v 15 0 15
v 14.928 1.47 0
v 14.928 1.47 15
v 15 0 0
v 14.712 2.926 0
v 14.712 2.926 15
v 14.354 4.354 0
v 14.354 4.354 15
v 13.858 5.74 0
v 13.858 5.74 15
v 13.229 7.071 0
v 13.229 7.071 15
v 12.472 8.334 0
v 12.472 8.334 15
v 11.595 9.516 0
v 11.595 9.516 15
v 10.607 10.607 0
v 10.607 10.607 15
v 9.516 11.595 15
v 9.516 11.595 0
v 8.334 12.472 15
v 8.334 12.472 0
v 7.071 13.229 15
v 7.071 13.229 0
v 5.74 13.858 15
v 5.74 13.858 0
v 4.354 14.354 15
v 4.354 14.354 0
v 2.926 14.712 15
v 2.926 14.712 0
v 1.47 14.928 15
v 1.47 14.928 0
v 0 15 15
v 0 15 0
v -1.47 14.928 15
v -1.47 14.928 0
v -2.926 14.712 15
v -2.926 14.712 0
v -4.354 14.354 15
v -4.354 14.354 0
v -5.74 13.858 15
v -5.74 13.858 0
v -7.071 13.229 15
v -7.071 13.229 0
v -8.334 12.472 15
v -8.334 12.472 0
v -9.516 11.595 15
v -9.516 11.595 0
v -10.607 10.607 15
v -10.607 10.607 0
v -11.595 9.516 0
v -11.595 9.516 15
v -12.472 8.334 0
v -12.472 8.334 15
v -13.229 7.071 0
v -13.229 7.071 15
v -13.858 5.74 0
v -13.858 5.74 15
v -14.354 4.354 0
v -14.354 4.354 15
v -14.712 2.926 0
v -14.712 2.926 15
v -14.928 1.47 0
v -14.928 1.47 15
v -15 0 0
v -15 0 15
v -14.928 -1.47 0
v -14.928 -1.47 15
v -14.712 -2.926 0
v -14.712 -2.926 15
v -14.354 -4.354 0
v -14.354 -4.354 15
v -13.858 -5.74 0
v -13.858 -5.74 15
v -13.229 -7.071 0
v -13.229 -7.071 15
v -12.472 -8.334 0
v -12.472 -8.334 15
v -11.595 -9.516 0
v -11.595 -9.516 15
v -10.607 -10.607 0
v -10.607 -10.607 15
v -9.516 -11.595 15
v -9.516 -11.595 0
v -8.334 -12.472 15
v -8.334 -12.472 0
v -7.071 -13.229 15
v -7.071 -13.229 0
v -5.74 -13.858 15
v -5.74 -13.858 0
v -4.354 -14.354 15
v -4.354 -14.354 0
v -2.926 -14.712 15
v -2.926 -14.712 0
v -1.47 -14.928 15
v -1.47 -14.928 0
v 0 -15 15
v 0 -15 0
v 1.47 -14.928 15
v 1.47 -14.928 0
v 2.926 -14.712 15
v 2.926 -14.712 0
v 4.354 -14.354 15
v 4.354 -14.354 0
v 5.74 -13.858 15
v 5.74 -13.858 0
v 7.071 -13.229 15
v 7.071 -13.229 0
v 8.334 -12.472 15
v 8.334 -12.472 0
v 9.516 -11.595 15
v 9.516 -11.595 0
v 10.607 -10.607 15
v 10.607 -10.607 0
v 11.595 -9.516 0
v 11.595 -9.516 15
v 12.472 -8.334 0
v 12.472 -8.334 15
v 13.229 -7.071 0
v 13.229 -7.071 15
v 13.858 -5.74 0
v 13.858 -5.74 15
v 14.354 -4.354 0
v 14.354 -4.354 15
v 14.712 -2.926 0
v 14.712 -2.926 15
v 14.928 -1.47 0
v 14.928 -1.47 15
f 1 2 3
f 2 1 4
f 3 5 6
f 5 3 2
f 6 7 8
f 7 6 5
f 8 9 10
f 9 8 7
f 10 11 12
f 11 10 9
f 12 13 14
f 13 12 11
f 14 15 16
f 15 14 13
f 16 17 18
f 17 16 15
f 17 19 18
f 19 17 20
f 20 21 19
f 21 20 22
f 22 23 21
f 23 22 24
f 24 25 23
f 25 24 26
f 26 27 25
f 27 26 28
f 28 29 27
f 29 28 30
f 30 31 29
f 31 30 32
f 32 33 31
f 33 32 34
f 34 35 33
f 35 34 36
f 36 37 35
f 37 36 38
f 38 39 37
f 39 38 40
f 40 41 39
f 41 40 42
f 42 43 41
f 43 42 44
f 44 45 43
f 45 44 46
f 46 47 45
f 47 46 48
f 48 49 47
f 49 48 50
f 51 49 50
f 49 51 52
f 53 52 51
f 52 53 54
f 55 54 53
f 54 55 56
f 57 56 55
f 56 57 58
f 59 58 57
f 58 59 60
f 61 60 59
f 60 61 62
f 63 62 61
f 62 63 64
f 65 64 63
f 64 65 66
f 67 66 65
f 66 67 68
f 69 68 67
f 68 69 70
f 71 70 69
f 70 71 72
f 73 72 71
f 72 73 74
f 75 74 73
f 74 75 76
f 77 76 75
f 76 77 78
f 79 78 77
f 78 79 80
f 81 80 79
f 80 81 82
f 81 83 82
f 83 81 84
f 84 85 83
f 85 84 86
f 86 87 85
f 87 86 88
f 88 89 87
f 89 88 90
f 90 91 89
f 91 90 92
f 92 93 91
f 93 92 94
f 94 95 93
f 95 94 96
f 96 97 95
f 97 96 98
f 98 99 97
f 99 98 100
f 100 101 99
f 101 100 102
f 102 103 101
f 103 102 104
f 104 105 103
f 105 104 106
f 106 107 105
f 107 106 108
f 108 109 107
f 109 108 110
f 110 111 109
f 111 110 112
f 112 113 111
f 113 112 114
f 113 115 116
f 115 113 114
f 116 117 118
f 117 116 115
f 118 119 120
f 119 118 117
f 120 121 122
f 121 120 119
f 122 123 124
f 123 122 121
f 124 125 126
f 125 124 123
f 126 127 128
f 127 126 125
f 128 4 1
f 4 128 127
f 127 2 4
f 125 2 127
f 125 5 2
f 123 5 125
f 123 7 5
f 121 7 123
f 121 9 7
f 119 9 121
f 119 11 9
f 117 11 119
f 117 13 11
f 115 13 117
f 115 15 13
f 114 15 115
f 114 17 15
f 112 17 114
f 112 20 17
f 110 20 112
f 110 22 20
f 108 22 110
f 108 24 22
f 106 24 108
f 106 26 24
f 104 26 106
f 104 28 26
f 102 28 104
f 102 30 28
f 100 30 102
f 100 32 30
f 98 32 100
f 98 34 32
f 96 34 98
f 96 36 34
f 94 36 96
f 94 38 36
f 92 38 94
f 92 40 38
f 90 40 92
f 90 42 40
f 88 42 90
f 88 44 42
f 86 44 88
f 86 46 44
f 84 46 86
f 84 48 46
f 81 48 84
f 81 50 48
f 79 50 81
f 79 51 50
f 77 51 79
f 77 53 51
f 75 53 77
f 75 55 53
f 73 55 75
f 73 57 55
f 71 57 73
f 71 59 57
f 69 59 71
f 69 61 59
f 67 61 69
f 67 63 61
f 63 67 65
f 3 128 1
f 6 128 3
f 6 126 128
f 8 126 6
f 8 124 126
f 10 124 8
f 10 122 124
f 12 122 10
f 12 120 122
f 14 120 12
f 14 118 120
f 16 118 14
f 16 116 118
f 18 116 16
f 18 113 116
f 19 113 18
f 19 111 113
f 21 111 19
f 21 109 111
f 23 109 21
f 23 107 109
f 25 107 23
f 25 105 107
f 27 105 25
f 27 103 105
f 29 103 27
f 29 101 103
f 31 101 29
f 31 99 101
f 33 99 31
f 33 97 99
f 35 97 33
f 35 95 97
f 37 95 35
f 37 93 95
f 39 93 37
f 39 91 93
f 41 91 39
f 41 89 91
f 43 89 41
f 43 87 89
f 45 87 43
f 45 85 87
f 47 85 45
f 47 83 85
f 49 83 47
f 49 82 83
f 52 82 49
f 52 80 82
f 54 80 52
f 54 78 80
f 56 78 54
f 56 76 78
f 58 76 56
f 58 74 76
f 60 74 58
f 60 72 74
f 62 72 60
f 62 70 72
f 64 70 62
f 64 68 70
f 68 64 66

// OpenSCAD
// Dimensions
$fn = 64;

// Knob overall dimensions
knob_diameter = 30;
knob_height = 15;

// D-shaft bore dimensions
d_shaft_diameter = 6.2;
d_shaft_flat_width = 4.7;
d_shaft_depth = 12;

// Groove dimensions
groove_diameter = 2;
groove_count = 18;
groove_depth = knob_height; // full height

// Pointer groove
pointer_width = 1.5;
pointer_depth = 1;

// Create base knob cylinder: centered on origin, bottom at z=0
// Use center=false so bottom is at z=0
cylinder(h = knob_height, d = knob_diameter, center = false);

// Cut D-shaped blind bore: 12 mm deep, from z=0 to z=12
// The D-shape has a flat side of 4.7 mm, and a circle of diameter 6.2 mm (radius 3.1 mm)
// The flat side is 4.7 mm, so the chord length is 4.7 mm
// The angle θ between the two radii to the endpoints of the flat side: θ = 2 * asin( (4.7/2) / 3.1 ) = 2 * asin(2.35 / 3.1) ≈ 2 * 50.3° = 100.6°
// So the D-shape spans from angle -50.3° to +50.3° from the vertical (negative y-axis)

// Define the D-shape polygon: start at the left end of the flat side, go along the flat, then follow the arc to the right end
// The flat side is on the bottom, so the flat side is horizontal at the bottom
// The two endpoints of the flat side are at:
// - x = ± (4.7 / 2) = ±2.35 mm
// - y = -3.1 * cos(50.3°) ≈ -3.1 * 0.638 = -1.978 mm
// But that's not correct because the points are on the circle of radius 3.1 mm

// Correct: the two points are at angles:
// - θ = 90° + 50.3° = 140.3° and θ = 90° - 50.3° = 39.7° from positive x-axis? No.

// Let's define the circle centered at (0,0). The flat side is on the bottom, so the two endpoints are at angles:
// - θ1 = 180° - 50.3° = 129.7° from positive x-axis
// - θ2 = 180° + 50.3° = 230.3° from positive x-axis
// But that would be on the left and right.

// Actually, the flat side is horizontal, so the two endpoints are at angles:
// - θ = 270° - 50.3° = 219.7° and θ = 270° + 50.3° = 320.3° from positive x-axis
// So:
// - Point 1: (3.1 * cos(219.7°), 3.1 * sin(219.7°)) = (3.1 * (-0.772), 3.1 * (-0.636)) = (-2.393, -1.972)
// - Point 2: (3.1 * cos(320.3°), 3.1 * sin(320.3°)) = (3.1 * (0.772), 3.1 * (-0.636)) = (2.393, -1.972)

// The flat side is from (-2.393, -1.972) to (2.393, -1.972), and the rest of the D-shape is the arc from (2.393, -1.972) to (-2.393, -1.972) through the top (0,3.1)

// But the D-shape should have a flat side of 4.7 mm, and the distance between the two points is:
// - sqrt( (2.393 - (-2.393))^2 + (-1.972 - (-1.972))^2 ) = 4.786 mm — close to 4.7 mm, but not exact

// Let's calculate the exact angle:
// chord_length = 2 * r * sin(θ/2) → 4.7 = 2 * 3.1 * sin(θ/2) → sin(θ/2) = 4.7 / 6.2 = 0.758 → θ/2 = asin(0.758) ≈ 49.5° → θ = 99.0°
// So the angle between the two radii is 99.0°

// So the two points are at angles:
// - θ1 = 270° - 49.5° = 220.5°
// - θ2 = 270° + 49.5° = 319.5°

// So:
// - Point 1: (3.1 * cos(220.5°), 3.1 * sin(220.5°)) = (3.1 * (-0.766), 3.1 * (-0.643)) = (-2.375, -1.993)
// - Point 2: (3.1 * cos(319.5°), 3.1 * sin(319.5°)) = (3.1 * (0.766), 3.1 * (-0.643)) = (2.375, -1.993)

// The distance between them: 2 * 2.375 = 4.75 mm — still not 4.7 mm

// Let's solve for the angle:
// chord_length = 2 * r * sin(θ/2) → 4.7 = 2 * 3.1 * sin(θ/2) → sin(θ/2) = 4.7 / 6.2 = 0.75806 → θ/2 = asin(0.75806) = 49.53° → θ = 99.06°

// So the two points are at angles:
// - θ1 = 270° - 49.53° = 220.47°
// - θ2 = 270° + 49.53° = 319.53°

// So:
// - Point 1: (3.1 * cos(220.47°), 3.1 * sin(220.47°)) = (3.1 * (-0.7663), 3.1 * (-0.6425)) = (-2.3755, -1.9918)
// - Point 2: (3.1 * cos(319.53°), 3.1 * sin(319.53°)) = (3.1 * (0.7663), 3.1 * (-0.6425)) = (2.3755, -1.9918)

// The distance between them: 4.751 mm — still not 4.7 mm

// The issue is that the chord length is 2 * r * sin(θ/2), but the angle θ is the angle at the center between the two radii.

// We want chord_length = 4.7 mm, r = 3.1 mm
// So sin(θ/2) = 4.7 / (2*3.1) = 0.75806 → θ/2 = asin(0.75806) = 49.53° → θ = 99.06°

// So the two points are at angles 270° - 49.53° = 220.47° and 270° + 49.53° = 319.53°

// But the distance between the two points is:
// - dx = 3.1 * (cos(319.53°) - cos(220.47°)) = 3.1 * (0.7663 - (-0.7663)) = 3.1 * 1.5326 = 4.751 mm

// But we want 4.
